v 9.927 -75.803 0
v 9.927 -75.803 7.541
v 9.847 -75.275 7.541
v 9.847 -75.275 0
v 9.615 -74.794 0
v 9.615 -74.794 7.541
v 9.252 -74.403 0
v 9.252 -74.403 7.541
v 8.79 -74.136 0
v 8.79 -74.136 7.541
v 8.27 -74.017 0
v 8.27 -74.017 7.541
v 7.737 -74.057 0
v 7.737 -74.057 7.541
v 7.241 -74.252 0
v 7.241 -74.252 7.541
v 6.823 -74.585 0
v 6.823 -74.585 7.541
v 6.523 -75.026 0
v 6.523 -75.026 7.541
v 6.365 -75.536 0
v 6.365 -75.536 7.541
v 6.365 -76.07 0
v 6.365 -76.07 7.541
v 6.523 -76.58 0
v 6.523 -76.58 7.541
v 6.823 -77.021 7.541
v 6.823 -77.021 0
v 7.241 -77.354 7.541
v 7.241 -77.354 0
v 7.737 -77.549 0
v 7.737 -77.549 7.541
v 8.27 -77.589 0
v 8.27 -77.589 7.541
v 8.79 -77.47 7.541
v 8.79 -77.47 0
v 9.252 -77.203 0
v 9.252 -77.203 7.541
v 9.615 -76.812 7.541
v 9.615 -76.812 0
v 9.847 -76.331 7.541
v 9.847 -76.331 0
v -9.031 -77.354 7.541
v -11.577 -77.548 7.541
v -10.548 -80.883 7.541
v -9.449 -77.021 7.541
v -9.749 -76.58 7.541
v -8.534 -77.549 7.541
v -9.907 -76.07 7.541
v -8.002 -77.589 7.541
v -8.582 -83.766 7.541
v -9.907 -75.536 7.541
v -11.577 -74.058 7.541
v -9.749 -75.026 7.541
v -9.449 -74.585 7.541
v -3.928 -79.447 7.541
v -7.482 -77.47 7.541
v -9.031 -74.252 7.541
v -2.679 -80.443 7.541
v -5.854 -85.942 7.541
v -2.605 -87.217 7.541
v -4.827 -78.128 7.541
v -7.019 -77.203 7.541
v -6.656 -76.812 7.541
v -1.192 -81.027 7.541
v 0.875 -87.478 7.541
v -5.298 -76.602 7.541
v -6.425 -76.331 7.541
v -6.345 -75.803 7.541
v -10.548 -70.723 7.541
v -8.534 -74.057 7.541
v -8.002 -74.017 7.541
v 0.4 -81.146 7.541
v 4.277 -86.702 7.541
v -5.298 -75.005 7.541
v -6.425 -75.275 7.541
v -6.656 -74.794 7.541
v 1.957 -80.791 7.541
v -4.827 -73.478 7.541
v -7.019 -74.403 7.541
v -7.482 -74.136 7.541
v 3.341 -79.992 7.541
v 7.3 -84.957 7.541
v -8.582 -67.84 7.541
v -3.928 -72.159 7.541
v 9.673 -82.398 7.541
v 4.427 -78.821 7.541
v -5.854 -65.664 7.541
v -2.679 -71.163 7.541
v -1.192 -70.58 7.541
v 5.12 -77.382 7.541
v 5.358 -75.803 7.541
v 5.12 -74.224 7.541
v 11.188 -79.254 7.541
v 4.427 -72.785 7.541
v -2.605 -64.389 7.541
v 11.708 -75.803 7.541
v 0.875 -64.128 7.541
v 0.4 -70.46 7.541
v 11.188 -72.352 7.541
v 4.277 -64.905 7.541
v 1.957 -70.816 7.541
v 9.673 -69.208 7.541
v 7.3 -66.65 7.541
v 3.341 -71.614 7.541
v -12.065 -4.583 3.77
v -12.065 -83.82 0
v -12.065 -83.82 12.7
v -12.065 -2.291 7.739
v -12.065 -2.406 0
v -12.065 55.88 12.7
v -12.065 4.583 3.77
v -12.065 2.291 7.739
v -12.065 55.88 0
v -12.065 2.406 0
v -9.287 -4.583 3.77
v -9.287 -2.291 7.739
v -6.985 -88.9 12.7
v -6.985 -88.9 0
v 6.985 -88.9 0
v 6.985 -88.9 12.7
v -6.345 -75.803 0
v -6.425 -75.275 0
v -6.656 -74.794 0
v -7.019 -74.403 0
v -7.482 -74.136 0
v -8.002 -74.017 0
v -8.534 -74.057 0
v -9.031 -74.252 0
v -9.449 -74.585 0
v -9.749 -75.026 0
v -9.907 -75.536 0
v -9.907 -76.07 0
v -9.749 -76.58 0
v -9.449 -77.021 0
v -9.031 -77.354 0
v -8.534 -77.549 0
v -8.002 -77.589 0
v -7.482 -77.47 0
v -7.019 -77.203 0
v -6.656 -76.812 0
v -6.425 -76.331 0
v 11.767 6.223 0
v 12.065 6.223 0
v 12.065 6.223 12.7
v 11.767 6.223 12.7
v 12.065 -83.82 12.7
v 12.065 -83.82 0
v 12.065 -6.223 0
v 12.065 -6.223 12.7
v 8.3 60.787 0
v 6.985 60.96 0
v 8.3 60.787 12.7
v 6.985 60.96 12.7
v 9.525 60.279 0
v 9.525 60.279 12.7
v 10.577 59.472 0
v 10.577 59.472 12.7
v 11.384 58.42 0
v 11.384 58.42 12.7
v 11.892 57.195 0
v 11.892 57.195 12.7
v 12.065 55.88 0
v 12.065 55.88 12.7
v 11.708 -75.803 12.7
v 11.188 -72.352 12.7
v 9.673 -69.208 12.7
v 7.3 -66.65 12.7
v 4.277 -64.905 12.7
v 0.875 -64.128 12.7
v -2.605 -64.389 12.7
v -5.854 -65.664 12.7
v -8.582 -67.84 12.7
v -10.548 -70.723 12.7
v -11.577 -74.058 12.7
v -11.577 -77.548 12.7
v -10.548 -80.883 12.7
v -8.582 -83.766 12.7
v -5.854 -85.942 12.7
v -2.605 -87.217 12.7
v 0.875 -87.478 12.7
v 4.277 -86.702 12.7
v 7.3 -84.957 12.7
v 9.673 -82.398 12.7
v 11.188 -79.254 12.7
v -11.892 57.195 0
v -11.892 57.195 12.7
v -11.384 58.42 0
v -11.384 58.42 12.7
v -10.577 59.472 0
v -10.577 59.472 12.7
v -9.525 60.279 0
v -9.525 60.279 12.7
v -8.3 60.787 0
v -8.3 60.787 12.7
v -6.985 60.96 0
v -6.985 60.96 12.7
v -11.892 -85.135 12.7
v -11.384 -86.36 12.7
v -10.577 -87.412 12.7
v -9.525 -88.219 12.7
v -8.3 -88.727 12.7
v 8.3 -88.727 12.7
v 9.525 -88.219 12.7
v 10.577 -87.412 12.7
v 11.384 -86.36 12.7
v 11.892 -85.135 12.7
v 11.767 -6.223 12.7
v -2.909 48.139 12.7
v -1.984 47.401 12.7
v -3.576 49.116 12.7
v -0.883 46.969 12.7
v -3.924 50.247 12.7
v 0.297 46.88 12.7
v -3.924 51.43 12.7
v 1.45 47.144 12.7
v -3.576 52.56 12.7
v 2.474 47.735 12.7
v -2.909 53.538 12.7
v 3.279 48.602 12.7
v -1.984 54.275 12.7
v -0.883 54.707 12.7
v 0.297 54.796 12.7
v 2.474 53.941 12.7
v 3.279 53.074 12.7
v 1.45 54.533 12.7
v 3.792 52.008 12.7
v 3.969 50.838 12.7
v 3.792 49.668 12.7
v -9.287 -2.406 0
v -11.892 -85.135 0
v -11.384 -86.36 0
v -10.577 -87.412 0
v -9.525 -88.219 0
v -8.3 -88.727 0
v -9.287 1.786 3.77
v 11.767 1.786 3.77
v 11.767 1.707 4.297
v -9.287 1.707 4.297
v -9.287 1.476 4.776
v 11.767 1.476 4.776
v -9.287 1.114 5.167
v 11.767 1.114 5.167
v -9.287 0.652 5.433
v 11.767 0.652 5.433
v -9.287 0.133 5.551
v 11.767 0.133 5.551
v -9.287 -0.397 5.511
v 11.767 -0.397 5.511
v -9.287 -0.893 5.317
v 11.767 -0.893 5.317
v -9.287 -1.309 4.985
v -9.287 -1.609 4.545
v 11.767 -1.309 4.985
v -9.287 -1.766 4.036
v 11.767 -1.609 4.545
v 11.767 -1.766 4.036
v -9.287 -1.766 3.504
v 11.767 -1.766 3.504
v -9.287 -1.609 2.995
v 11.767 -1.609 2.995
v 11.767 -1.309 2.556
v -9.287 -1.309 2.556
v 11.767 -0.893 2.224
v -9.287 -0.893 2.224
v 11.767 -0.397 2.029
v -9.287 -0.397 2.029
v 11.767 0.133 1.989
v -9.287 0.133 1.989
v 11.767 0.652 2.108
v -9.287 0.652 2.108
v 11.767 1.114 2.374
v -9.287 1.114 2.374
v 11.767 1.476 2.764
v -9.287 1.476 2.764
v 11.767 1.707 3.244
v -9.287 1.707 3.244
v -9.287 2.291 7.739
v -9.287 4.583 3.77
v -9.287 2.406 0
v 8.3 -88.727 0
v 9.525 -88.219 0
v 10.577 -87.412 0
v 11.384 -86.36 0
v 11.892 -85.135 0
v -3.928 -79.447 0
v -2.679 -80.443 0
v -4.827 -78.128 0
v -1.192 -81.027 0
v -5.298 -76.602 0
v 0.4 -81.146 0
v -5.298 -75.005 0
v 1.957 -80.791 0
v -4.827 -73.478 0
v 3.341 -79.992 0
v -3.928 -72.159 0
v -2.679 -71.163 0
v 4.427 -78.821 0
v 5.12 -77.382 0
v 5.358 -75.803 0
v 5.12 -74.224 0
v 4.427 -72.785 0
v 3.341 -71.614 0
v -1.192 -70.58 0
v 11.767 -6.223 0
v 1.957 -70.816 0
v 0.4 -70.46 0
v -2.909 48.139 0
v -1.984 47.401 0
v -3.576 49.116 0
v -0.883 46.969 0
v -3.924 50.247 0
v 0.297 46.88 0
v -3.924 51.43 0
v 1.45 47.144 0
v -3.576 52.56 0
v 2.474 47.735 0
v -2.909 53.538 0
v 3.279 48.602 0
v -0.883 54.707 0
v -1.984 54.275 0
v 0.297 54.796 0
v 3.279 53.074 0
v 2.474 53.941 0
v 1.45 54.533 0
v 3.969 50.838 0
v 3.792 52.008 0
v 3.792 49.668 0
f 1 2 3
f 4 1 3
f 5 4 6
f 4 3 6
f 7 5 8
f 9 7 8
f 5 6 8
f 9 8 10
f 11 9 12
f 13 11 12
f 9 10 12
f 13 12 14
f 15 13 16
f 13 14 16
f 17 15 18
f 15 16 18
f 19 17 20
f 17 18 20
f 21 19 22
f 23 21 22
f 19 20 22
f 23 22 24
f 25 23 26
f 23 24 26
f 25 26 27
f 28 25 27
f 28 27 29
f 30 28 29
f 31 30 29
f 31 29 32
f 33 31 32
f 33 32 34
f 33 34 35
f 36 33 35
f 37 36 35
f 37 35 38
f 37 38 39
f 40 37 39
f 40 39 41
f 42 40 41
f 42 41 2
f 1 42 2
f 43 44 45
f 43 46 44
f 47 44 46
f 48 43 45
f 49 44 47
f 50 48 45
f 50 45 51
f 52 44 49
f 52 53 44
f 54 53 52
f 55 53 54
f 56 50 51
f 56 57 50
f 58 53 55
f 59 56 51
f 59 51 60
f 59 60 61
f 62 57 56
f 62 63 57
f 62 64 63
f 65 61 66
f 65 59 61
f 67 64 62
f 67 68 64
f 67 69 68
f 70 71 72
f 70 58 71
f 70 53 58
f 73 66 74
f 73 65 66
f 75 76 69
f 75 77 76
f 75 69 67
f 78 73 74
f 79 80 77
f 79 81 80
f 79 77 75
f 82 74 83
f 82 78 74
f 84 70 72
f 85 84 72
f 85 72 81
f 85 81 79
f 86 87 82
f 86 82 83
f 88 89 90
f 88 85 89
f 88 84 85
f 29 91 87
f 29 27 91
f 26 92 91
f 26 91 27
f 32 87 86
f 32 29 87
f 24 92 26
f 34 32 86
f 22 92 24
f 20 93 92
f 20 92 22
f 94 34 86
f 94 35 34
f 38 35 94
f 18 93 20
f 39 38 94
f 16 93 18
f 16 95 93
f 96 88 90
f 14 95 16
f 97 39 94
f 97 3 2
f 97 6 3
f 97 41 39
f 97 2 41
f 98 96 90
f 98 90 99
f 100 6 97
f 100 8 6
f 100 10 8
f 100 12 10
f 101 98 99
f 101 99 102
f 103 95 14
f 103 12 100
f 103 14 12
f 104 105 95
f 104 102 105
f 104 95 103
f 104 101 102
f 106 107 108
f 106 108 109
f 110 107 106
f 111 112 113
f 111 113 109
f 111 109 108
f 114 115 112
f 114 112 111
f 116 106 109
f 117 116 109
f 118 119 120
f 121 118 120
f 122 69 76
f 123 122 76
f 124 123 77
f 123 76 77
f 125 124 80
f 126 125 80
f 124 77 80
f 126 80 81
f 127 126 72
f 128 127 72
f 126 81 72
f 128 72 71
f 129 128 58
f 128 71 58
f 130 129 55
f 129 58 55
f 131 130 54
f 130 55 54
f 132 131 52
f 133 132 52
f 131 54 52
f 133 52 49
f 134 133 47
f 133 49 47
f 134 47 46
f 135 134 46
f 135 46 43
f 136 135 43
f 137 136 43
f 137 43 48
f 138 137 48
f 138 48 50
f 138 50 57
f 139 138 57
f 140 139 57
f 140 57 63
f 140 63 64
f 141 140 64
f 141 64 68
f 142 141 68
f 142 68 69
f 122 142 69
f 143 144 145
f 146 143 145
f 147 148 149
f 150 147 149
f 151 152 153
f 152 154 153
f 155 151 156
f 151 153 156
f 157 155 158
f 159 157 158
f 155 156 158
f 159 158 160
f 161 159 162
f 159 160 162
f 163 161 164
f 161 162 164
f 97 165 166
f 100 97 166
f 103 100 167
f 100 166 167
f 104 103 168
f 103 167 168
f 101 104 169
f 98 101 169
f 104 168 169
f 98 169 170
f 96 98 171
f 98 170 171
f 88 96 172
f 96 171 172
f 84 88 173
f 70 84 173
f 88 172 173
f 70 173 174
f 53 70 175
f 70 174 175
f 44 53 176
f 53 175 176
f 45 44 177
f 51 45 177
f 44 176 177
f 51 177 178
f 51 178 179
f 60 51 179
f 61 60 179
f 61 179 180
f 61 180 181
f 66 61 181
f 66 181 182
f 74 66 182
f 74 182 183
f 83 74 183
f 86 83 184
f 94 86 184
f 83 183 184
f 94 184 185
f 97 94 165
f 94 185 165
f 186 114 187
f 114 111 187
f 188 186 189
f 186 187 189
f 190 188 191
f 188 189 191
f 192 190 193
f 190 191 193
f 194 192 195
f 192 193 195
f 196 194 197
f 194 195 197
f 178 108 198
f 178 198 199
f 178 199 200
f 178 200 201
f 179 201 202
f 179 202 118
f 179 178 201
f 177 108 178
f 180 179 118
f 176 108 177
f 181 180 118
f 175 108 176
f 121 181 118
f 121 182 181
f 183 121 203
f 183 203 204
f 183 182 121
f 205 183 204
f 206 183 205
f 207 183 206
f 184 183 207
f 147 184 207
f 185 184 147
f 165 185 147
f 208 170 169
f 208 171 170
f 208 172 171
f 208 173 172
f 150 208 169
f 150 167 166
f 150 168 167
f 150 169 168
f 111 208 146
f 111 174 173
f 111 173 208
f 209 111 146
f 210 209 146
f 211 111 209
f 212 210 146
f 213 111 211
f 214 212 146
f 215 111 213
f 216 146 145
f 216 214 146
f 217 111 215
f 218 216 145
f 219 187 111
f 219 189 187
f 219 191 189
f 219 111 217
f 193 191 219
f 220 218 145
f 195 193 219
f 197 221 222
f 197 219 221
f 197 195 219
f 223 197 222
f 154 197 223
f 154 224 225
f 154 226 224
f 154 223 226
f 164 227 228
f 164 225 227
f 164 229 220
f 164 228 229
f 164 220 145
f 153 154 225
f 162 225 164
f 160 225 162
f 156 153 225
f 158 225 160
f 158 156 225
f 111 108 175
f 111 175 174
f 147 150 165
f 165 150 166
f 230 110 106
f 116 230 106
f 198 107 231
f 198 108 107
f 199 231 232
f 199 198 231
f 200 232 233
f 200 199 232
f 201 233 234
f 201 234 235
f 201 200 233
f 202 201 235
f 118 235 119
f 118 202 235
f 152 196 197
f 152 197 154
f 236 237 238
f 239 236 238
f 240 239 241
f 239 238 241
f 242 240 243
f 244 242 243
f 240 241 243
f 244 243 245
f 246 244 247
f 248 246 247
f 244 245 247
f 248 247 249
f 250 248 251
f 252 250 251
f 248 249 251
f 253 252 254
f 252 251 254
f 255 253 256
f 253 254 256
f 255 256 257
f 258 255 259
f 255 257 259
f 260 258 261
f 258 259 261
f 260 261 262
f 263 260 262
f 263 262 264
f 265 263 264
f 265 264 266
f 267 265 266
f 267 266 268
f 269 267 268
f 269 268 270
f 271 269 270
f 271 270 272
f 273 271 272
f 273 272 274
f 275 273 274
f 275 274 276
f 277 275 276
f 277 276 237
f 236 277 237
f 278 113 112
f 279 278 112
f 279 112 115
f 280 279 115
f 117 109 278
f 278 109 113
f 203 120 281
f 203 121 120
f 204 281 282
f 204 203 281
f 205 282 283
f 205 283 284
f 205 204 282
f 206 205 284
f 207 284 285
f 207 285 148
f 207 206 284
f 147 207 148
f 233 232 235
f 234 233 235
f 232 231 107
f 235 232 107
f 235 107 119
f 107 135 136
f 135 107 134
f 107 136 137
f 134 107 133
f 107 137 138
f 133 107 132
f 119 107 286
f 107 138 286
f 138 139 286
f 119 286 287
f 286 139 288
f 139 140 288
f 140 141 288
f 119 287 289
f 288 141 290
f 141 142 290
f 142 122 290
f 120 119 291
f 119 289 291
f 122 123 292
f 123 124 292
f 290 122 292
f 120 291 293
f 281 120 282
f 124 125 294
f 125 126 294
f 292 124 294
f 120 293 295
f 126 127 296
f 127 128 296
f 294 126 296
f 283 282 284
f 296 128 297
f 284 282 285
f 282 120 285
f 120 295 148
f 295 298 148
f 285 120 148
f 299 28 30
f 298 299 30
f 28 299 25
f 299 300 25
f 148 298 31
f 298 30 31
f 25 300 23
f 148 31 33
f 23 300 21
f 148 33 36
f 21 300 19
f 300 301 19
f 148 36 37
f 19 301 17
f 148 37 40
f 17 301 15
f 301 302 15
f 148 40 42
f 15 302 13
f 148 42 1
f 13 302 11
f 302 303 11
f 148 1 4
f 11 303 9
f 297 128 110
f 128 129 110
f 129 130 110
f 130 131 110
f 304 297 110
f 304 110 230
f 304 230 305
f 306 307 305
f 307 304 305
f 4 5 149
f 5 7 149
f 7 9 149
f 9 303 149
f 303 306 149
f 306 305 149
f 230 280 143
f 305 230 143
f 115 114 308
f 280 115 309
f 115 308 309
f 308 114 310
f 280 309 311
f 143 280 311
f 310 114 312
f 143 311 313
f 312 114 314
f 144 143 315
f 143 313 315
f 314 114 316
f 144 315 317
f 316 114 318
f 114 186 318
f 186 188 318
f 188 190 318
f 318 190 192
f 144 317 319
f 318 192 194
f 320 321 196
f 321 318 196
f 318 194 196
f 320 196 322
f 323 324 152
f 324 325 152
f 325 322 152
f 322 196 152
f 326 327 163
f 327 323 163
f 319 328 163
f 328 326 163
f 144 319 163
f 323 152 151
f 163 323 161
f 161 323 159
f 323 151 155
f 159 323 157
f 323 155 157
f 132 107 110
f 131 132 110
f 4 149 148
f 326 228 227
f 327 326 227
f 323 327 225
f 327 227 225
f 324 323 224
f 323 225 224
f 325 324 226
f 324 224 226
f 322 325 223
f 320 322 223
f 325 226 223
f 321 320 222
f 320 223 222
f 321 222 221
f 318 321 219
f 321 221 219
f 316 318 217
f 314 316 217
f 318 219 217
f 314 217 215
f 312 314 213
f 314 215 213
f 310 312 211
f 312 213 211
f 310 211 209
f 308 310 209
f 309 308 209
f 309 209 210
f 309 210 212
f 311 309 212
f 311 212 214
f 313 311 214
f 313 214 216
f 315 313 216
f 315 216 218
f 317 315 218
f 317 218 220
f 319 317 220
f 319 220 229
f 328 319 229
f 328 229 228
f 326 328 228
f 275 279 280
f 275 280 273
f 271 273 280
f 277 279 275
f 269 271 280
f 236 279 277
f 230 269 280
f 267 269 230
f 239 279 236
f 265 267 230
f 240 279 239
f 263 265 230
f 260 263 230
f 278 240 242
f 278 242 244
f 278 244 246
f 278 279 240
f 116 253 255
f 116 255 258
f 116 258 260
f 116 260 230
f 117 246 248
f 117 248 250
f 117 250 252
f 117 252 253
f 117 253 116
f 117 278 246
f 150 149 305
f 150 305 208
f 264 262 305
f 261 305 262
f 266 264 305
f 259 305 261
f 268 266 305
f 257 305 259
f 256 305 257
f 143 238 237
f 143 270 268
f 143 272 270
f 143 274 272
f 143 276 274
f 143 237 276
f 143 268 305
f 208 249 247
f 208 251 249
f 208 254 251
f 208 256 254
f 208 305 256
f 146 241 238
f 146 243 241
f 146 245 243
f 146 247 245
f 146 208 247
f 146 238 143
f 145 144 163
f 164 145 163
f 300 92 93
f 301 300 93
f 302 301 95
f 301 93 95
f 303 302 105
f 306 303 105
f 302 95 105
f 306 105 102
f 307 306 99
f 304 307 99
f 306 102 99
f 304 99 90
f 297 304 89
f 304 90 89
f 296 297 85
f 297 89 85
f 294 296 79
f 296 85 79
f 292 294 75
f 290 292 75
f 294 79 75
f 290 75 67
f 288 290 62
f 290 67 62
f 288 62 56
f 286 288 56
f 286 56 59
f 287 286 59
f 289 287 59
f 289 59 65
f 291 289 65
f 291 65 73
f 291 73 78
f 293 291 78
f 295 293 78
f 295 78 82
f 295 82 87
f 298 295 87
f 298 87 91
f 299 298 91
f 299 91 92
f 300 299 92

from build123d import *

# Parameters (mm, degrees)
F0_W      = 24.13
F0_H      = 149.86
F1_DEPTH  = 12.7
F2_W      = 12.446
F2_H      = 20.32
F3_DEPTH  = 0.29765625
F4_R      = 3.96875
F5_DEPTH  = 25.4
F7_R      = 1.7859375
F8_DEPTH  = 25.4
F6_R      = 11.7078125
F9_DEPTH  = 5.159375
F10_R     = 5.3578125
F11_DEPTH = 25.4
F12_R     = 1.7907
F13_DEPTH = 25.4
F14_R     = 5.08
F16_DEPTH = 2.778125


# Not quite as in the source:
# - a length typed as a fraction of an inch, garbled in the dataset ("3 / 203.2 mm" for 3/8 in), is restored


with BuildPart() as f1:
    # F0 (on Top) → F1 (new body)
    with BuildSketch(Plane.XY):
        with Locations((0, -13.97)):
            Rectangle(F0_W, F0_H)
    extrude(amount=F1_DEPTH)

    # F2 (on face) → F3 (cut)
    with BuildSketch(Plane.YZ.offset(12.065)):
        with Locations((0, 2.54)):
            Rectangle(F2_W, F2_H)
    extrude(amount=-F3_DEPTH, mode=Mode.SUBTRACT)

    # F4 (on face) → F5 (cut)
    with BuildSketch(Plane.XY.offset(12.7)):
        with Locations((0, 50.8381508)):
            Circle(F4_R)
    extrude(amount=-F5_DEPTH, mode=Mode.SUBTRACT)

    # F7 (on face) → F8 (cut)
    with BuildSketch(Plane.YZ.offset(11.76734375)):
        with Locations((0, 3.7703125)):
            Circle(F7_R)
    extrude(amount=-F8_DEPTH, mode=Mode.SUBTRACT)

    # F6 (on face) → F9 (cut)
    with BuildSketch(Plane.XY.offset(12.7)):
        with Locations((0, -75.803125)):
            Circle(F6_R)
    extrude(amount=-F9_DEPTH, mode=Mode.SUBTRACT)

    # F10 (on face) → F11 (cut)
    with BuildSketch(Plane.XY.offset(7.540625)):
        with Locations((0, -75.803125)):
            Circle(F10_R)
    extrude(amount=-F11_DEPTH, mode=Mode.SUBTRACT)

    # F12 (on face) → F13 (cut)
    with BuildSketch(Plane.XY.offset(7.540625)):
        with Locations((-8.1359375, -75.803125)):
            Circle(F12_R)
        with Locations((8.1359375, -75.803125)):
            Circle(F12_R)
    extrude(amount=-F13_DEPTH, mode=Mode.SUBTRACT)

    # F14
    f14_edges = [f1.edges().sort_by_distance(p)[0] for p in [
        (-12.065, -88.9, 6.35),
        (12.065, -88.9, 6.35),
        (-12.065, 60.96, 6.35),
        (12.065, 60.96, 6.35),
    ]]
    fillet(f14_edges, radius=F14_R)

    # F15 (on face) → F16 (cut)
    with BuildSketch(Plane(origin=(-12.065, 0, 0), x_dir=(0, -1, 0), z_dir=(-1, 0, 0))):
        Polygon((2.2913588808, 7.7390625), (-2.2913588808, 7.7390625), (-4.5827177617, 3.7703125), (-2.2913588808, -0.1984375), (2.2913588808, -0.1984375), (4.5827177617, 3.7703125), align=None)
    extrude(amount=-F16_DEPTH, mode=Mode.SUBTRACT)


solid = f1.part
